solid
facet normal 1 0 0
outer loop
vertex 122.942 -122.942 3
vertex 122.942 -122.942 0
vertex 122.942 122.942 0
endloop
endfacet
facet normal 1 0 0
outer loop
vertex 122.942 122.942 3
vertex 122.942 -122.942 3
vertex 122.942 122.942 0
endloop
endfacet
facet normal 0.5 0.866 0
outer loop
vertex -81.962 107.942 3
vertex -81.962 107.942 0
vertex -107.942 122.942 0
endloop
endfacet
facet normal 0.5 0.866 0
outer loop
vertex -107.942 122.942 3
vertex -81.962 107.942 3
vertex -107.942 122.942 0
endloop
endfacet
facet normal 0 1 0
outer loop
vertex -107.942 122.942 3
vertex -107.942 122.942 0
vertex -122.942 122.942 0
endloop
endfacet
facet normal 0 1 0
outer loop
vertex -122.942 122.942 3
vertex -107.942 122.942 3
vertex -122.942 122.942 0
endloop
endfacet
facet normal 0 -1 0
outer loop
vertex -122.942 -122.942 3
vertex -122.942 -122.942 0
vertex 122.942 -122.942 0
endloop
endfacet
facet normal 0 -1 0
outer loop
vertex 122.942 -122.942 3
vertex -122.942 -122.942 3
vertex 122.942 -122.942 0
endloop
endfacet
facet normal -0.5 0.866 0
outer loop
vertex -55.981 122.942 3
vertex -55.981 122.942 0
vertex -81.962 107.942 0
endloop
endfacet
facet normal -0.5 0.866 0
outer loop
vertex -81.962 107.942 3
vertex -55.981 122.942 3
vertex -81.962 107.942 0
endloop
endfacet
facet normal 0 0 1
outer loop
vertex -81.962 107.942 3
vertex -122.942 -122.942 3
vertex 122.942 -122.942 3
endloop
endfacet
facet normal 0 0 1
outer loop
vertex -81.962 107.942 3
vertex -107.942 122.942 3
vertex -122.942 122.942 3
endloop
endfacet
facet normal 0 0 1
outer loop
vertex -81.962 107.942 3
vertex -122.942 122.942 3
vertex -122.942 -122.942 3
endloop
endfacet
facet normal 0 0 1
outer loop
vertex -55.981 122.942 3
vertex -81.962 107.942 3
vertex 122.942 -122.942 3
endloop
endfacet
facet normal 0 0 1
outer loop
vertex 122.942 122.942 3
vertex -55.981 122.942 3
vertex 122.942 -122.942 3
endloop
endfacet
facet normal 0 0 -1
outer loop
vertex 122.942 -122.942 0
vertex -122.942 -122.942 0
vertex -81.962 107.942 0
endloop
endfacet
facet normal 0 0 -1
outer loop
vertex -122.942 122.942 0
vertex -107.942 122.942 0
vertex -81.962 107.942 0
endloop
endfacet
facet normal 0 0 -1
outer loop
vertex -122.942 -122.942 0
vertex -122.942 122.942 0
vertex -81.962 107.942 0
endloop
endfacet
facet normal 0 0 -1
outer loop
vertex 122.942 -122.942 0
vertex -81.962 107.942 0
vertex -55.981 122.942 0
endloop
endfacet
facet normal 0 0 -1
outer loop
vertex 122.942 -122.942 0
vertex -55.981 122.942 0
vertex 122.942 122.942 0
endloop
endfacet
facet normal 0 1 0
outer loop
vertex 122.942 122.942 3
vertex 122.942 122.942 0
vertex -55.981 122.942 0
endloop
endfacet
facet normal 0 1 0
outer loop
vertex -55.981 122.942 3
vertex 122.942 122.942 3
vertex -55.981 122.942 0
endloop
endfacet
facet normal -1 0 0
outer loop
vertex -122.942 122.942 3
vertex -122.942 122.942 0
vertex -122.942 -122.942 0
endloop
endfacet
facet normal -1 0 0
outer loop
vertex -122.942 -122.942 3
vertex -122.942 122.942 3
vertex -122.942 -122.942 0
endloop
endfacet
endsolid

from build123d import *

# Parameters (mm, degrees)
F1_DEPTH = 3


with BuildPart() as f1:
    # F0 (on Top) → F1 (new body)
    with BuildSketch(Plane.XY):
        Polygon((-81.961524, 107.942286), (-66.961524, 81.961524), (-40.980762, 96.961524), (-55.980762, 122.942286), align=None)
        Polygon((-122.942286, 96.961524), (-107.942286, 122.942286), (-122.942286, 122.942286), align=None)
        Polygon((-122.942286, 66.961524), (-96.961524, 81.961524), (-122.942286, 96.961524), align=None)
        Polygon((-81.961524, 55.980762), (-66.961524, 81.961524), (-81.961524, 107.942286), (-96.961524, 81.961524), align=None)
        Polygon((40.980762, 96.961524), (40.980762, 66.961524), (66.961524, 81.961524), align=None)
        Polygon((-122.942286, -122.942286), (-107.942286, -122.942286), (-122.942286, -96.961524), align=None)
        Polygon((-55.980762, -122.942286), (-81.961524, -107.942286), (-107.942286, -122.942286), align=None)
        Polygon((-81.961524, -107.942286), (-66.961524, -81.961524), (-81.961524, -55.980762), (-96.961524, -81.961524), align=None)
        Polygon((-96.961524, -81.961524), (-81.961524, -55.980762), (-107.942286, -40.980762), (-122.942286, -66.961524), align=None)
        Polygon((-40.980762, -96.961524), (-40.980762, -66.961524), (-66.961524, -81.961524), align=None)
        Polygon((-66.961524, -81.961524), (-40.980762, -66.961524), (-55.980762, -40.980762), (-81.961524, -55.980762), align=None)
        Polygon((-40.980762, -15), (-15, 0), (-40.980762, 15), align=None)
        Polygon((-96.961524, 0), (-81.961524, 25.980762), (-107.942286, 40.980762), (-122.942286, 15), align=None)
        Polygon((-81.961524, -25.980762), (-66.961524, 0), (-81.961524, 25.980762), (-96.961524, 0), align=None)
        Polygon((-122.942286, -15), (-96.961524, 0), (-122.942286, 15), align=None)
        Polygon((-107.942286, 40.980762), (-81.961524, 55.980762), (-96.961524, 81.961524), (-122.942286, 66.961524), align=None)
        Polygon((-122.942286, 15), (-107.942286, 40.980762), (-122.942286, 66.961524), align=None)
        Polygon((-96.961524, 81.961524), (-81.961524, 107.942286), (-107.942286, 122.942286), (-122.942286, 96.961524), align=None)
        Polygon((-81.961524, 25.980762), (-55.980762, 40.980762), (-81.961524, 55.980762), align=None)
        Polygon((40.980762, 66.961524), (55.980762, 40.980762), (81.961524, 55.980762), (66.961524, 81.961524), align=None)
        Polygon((0, 55.980762), (25.980762, 40.980762), (40.980762, 66.961524), (15, 81.961524), align=None)
        Polygon((66.961524, 81.961524), (81.961524, 55.980762), (96.961524, 81.961524), (81.961524, 107.942286), align=None)
        Polygon((15, 81.961524), (40.980762, 66.961524), (40.980762, 96.961524), align=None)
        Polygon((-15, -81.961524), (-40.980762, -66.961524), (-40.980762, -96.961524), align=None)
        Polygon((-40.980762, -96.961524), (-66.961524, -81.961524), (-81.961524, -107.942286), (-55.980762, -122.942286), align=None)
        Polygon((0, -55.980762), (-25.980762, -40.980762), (-40.980762, -66.961524), (-15, -81.961524), align=None)
        Polygon((-40.980762, -66.961524), (-25.980762, -40.980762), (-40.980762, -15), (-55.980762, -40.980762), align=None)
        Polygon((-81.961524, -55.980762), (-55.980762, -40.980762), (-81.961524, -25.980762), align=None)
        Polygon((-107.942286, -122.942286), (-81.961524, -107.942286), (-96.961524, -81.961524), (-122.942286, -96.961524), align=None)
        Polygon((-122.942286, -96.961524), (-96.961524, -81.961524), (-122.942286, -66.961524), align=None)
        Polygon((25.980762, -122.942286), (0, -107.942286), (-25.980762, -122.942286), align=None)
        Polygon((40.980762, -96.961524), (15, -81.961524), (0, -107.942286), (25.980762, -122.942286), align=None)
        Polygon((0, -107.942286), (-15, -81.961524), (-40.980762, -96.961524), (-25.980762, -122.942286), align=None)
        Polygon((-25.980762, -122.942286), (-40.980762, -96.961524), (-55.980762, -122.942286), align=None)
        Polygon((-55.980762, 122.942286), (-40.980762, 96.961524), (-25.980762, 122.942286), align=None)
        Polygon((-25.980762, 122.942286), (0, 107.942286), (25.980762, 122.942286), align=None)
        Polygon((0, 107.942286), (15, 81.961524), (40.980762, 96.961524), (25.980762, 122.942286), align=None)
        Polygon((-40.980762, 96.961524), (-15, 81.961524), (0, 107.942286), (-25.980762, 122.942286), align=None)
        Polygon((40.980762, 96.961524), (66.961524, 81.961524), (81.961524, 107.942286), (55.980762, 122.942286), align=None)
        Polygon((25.980762, 122.942286), (40.980762, 96.961524), (55.980762, 122.942286), align=None)
        Polygon((55.980762, 122.942286), (81.961524, 107.942286), (107.942286, 122.942286), align=None)
        Polygon((107.942286, 122.942286), (122.942286, 96.961524), (122.942286, 122.942286), align=None)
        Polygon((0, -55.980762), (0, -25.980762), (-25.980762, -40.980762), align=None)
        Polygon((81.961524, 107.942286), (96.961524, 81.961524), (122.942286, 96.961524), (107.942286, 122.942286), align=None)
        Polygon((-107.942286, 40.980762), (-81.961524, 25.980762), (-81.961524, 55.980762), align=None)
        Polygon((-122.942286, -66.961524), (-107.942286, -40.980762), (-122.942286, -15), align=None)
        Polygon((-66.961524, 81.961524), (-40.980762, 66.961524), (-40.980762, 96.961524), align=None)
        Polygon((-81.961524, -55.980762), (-81.961524, -25.980762), (-107.942286, -40.980762), align=None)
        Polygon((-107.942286, -40.980762), (-81.961524, -25.980762), (-96.961524, 0), (-122.942286, -15), align=None)
        Polygon((122.942286, -66.961524), (96.961524, -81.961524), (122.942286, -96.961524), align=None)
        Polygon((122.942286, -96.961524), (96.961524, -81.961524), (81.961524, -107.942286), (107.942286, -122.942286), align=None)
        Polygon((66.961524, -81.961524), (40.980762, -66.961524), (40.980762, -96.961524), align=None)
        Polygon((81.961524, -55.980762), (55.980762, -40.980762), (40.980762, -66.961524), (66.961524, -81.961524), align=None)
        Polygon((-40.980762, 96.961524), (-40.980762, 66.961524), (-15, 81.961524), align=None)
        Polygon((40.980762, -96.961524), (40.980762, -66.961524), (15, -81.961524), align=None)
        Polygon((107.942286, -122.942286), (81.961524, -107.942286), (55.980762, -122.942286), align=None)
        Polygon((-15, 81.961524), (0, 55.980762), (15, 81.961524), (0, 107.942286), align=None)
        Polygon((55.980762, -122.942286), (40.980762, -96.961524), (25.980762, -122.942286), align=None)
        Polygon((0, -25.980762), (15, 0), (0, 25.980762), (-15, 0), align=None)
        Polygon((0, 25.980762), (15, 0), (40.980762, 15), (25.980762, 40.980762), align=None)
        Polygon((122.942286, 96.961524), (96.961524, 81.961524), (122.942286, 66.961524), align=None)
        Polygon((25.980762, 40.980762), (40.980762, 15), (55.980762, 40.980762), (40.980762, 66.961524), align=None)
        Polygon((25.980762, -40.980762), (0, -25.980762), (0, -55.980762), align=None)
        Polygon((96.961524, 0), (81.961524, -25.980762), (107.942286, -40.980762), (122.942286, -15), align=None)
        Polygon((66.961524, 0), (40.980762, 15), (40.980762, -15), align=None)
        Polygon((122.942286, 66.961524), (107.942286, 40.980762), (122.942286, 15), align=None)
        Polygon((55.980762, -40.980762), (40.980762, -15), (25.980762, -40.980762), (40.980762, -66.961524), align=None)
        Polygon((81.961524, 25.980762), (66.961524, 0), (81.961524, -25.980762), (96.961524, 0), align=None)
        Polygon((40.980762, -15), (15, 0), (0, -25.980762), (25.980762, -40.980762), align=None)
        Polygon((122.942286, -122.942286), (122.942286, -96.961524), (107.942286, -122.942286), align=None)
        Polygon((-15, 0), (0, 25.980762), (-25.980762, 40.980762), (-40.980762, 15), align=None)
        Polygon((-25.980762, 40.980762), (0, 25.980762), (0, 55.980762), align=None)
        Polygon((107.942286, 40.980762), (81.961524, 25.980762), (96.961524, 0), (122.942286, 15), align=None)
        Polygon((122.942286, 15), (96.961524, 0), (122.942286, -15), align=None)
        Polygon((66.961524, 0), (40.980762, -15), (55.980762, -40.980762), (81.961524, -25.980762), align=None)
        Polygon((55.980762, 40.980762), (40.980762, 15), (66.961524, 0), (81.961524, 25.980762), align=None)
        Polygon((15, -81.961524), (0, -55.980762), (-15, -81.961524), (0, -107.942286), align=None)
        Polygon((0, 55.980762), (0, 25.980762), (25.980762, 40.980762), align=None)
        Polygon((96.961524, 81.961524), (81.961524, 55.980762), (107.942286, 40.980762), (122.942286, 66.961524), align=None)
        Polygon((81.961524, 55.980762), (55.980762, 40.980762), (81.961524, 25.980762), align=None)
        Polygon((81.961524, -25.980762), (55.980762, -40.980762), (81.961524, -55.980762), (107.942286, -40.980762), align=None)
        Polygon((81.961524, 55.980762), (81.961524, 25.980762), (107.942286, 40.980762), align=None)
        Polygon((122.942286, -15), (107.942286, -40.980762), (122.942286, -66.961524), align=None)
        Polygon((-40.980762, 66.961524), (-25.980762, 40.980762), (0, 55.980762), (-15, 81.961524), align=None)
        Polygon((107.942286, -40.980762), (81.961524, -55.980762), (96.961524, -81.961524), (122.942286, -66.961524), align=None)
        Polygon((96.961524, -81.961524), (81.961524, -55.980762), (66.961524, -81.961524), (81.961524, -107.942286), align=None)
        Polygon((81.961524, -107.942286), (66.961524, -81.961524), (40.980762, -96.961524), (55.980762, -122.942286), align=None)
        Polygon((-25.980762, -40.980762), (0, -25.980762), (-15, 0), (-40.980762, -15), align=None)
        Polygon((-55.980762, 40.980762), (-40.980762, 66.961524), (-66.961524, 81.961524), (-81.961524, 55.980762), align=None)
        Polygon((-40.980762, 15), (-25.980762, 40.980762), (-40.980762, 66.961524), (-55.980762, 40.980762), align=None)
        Polygon((40.980762, 15), (15, 0), (40.980762, -15), align=None)
        Polygon((40.980762, -66.961524), (25.980762, -40.980762), (0, -55.980762), (15, -81.961524), align=None)
        Polygon((-40.980762, -15), (-40.980762, 15), (-66.961524, 0), align=None)
        Polygon((-55.980762, -40.980762), (-40.980762, -15), (-66.961524, 0), (-81.961524, -25.980762), align=None)
        Polygon((-66.961524, 0), (-40.980762, 15), (-55.980762, 40.980762), (-81.961524, 25.980762), align=None)
    extrude(amount=F1_DEPTH)


solid = f1.part
